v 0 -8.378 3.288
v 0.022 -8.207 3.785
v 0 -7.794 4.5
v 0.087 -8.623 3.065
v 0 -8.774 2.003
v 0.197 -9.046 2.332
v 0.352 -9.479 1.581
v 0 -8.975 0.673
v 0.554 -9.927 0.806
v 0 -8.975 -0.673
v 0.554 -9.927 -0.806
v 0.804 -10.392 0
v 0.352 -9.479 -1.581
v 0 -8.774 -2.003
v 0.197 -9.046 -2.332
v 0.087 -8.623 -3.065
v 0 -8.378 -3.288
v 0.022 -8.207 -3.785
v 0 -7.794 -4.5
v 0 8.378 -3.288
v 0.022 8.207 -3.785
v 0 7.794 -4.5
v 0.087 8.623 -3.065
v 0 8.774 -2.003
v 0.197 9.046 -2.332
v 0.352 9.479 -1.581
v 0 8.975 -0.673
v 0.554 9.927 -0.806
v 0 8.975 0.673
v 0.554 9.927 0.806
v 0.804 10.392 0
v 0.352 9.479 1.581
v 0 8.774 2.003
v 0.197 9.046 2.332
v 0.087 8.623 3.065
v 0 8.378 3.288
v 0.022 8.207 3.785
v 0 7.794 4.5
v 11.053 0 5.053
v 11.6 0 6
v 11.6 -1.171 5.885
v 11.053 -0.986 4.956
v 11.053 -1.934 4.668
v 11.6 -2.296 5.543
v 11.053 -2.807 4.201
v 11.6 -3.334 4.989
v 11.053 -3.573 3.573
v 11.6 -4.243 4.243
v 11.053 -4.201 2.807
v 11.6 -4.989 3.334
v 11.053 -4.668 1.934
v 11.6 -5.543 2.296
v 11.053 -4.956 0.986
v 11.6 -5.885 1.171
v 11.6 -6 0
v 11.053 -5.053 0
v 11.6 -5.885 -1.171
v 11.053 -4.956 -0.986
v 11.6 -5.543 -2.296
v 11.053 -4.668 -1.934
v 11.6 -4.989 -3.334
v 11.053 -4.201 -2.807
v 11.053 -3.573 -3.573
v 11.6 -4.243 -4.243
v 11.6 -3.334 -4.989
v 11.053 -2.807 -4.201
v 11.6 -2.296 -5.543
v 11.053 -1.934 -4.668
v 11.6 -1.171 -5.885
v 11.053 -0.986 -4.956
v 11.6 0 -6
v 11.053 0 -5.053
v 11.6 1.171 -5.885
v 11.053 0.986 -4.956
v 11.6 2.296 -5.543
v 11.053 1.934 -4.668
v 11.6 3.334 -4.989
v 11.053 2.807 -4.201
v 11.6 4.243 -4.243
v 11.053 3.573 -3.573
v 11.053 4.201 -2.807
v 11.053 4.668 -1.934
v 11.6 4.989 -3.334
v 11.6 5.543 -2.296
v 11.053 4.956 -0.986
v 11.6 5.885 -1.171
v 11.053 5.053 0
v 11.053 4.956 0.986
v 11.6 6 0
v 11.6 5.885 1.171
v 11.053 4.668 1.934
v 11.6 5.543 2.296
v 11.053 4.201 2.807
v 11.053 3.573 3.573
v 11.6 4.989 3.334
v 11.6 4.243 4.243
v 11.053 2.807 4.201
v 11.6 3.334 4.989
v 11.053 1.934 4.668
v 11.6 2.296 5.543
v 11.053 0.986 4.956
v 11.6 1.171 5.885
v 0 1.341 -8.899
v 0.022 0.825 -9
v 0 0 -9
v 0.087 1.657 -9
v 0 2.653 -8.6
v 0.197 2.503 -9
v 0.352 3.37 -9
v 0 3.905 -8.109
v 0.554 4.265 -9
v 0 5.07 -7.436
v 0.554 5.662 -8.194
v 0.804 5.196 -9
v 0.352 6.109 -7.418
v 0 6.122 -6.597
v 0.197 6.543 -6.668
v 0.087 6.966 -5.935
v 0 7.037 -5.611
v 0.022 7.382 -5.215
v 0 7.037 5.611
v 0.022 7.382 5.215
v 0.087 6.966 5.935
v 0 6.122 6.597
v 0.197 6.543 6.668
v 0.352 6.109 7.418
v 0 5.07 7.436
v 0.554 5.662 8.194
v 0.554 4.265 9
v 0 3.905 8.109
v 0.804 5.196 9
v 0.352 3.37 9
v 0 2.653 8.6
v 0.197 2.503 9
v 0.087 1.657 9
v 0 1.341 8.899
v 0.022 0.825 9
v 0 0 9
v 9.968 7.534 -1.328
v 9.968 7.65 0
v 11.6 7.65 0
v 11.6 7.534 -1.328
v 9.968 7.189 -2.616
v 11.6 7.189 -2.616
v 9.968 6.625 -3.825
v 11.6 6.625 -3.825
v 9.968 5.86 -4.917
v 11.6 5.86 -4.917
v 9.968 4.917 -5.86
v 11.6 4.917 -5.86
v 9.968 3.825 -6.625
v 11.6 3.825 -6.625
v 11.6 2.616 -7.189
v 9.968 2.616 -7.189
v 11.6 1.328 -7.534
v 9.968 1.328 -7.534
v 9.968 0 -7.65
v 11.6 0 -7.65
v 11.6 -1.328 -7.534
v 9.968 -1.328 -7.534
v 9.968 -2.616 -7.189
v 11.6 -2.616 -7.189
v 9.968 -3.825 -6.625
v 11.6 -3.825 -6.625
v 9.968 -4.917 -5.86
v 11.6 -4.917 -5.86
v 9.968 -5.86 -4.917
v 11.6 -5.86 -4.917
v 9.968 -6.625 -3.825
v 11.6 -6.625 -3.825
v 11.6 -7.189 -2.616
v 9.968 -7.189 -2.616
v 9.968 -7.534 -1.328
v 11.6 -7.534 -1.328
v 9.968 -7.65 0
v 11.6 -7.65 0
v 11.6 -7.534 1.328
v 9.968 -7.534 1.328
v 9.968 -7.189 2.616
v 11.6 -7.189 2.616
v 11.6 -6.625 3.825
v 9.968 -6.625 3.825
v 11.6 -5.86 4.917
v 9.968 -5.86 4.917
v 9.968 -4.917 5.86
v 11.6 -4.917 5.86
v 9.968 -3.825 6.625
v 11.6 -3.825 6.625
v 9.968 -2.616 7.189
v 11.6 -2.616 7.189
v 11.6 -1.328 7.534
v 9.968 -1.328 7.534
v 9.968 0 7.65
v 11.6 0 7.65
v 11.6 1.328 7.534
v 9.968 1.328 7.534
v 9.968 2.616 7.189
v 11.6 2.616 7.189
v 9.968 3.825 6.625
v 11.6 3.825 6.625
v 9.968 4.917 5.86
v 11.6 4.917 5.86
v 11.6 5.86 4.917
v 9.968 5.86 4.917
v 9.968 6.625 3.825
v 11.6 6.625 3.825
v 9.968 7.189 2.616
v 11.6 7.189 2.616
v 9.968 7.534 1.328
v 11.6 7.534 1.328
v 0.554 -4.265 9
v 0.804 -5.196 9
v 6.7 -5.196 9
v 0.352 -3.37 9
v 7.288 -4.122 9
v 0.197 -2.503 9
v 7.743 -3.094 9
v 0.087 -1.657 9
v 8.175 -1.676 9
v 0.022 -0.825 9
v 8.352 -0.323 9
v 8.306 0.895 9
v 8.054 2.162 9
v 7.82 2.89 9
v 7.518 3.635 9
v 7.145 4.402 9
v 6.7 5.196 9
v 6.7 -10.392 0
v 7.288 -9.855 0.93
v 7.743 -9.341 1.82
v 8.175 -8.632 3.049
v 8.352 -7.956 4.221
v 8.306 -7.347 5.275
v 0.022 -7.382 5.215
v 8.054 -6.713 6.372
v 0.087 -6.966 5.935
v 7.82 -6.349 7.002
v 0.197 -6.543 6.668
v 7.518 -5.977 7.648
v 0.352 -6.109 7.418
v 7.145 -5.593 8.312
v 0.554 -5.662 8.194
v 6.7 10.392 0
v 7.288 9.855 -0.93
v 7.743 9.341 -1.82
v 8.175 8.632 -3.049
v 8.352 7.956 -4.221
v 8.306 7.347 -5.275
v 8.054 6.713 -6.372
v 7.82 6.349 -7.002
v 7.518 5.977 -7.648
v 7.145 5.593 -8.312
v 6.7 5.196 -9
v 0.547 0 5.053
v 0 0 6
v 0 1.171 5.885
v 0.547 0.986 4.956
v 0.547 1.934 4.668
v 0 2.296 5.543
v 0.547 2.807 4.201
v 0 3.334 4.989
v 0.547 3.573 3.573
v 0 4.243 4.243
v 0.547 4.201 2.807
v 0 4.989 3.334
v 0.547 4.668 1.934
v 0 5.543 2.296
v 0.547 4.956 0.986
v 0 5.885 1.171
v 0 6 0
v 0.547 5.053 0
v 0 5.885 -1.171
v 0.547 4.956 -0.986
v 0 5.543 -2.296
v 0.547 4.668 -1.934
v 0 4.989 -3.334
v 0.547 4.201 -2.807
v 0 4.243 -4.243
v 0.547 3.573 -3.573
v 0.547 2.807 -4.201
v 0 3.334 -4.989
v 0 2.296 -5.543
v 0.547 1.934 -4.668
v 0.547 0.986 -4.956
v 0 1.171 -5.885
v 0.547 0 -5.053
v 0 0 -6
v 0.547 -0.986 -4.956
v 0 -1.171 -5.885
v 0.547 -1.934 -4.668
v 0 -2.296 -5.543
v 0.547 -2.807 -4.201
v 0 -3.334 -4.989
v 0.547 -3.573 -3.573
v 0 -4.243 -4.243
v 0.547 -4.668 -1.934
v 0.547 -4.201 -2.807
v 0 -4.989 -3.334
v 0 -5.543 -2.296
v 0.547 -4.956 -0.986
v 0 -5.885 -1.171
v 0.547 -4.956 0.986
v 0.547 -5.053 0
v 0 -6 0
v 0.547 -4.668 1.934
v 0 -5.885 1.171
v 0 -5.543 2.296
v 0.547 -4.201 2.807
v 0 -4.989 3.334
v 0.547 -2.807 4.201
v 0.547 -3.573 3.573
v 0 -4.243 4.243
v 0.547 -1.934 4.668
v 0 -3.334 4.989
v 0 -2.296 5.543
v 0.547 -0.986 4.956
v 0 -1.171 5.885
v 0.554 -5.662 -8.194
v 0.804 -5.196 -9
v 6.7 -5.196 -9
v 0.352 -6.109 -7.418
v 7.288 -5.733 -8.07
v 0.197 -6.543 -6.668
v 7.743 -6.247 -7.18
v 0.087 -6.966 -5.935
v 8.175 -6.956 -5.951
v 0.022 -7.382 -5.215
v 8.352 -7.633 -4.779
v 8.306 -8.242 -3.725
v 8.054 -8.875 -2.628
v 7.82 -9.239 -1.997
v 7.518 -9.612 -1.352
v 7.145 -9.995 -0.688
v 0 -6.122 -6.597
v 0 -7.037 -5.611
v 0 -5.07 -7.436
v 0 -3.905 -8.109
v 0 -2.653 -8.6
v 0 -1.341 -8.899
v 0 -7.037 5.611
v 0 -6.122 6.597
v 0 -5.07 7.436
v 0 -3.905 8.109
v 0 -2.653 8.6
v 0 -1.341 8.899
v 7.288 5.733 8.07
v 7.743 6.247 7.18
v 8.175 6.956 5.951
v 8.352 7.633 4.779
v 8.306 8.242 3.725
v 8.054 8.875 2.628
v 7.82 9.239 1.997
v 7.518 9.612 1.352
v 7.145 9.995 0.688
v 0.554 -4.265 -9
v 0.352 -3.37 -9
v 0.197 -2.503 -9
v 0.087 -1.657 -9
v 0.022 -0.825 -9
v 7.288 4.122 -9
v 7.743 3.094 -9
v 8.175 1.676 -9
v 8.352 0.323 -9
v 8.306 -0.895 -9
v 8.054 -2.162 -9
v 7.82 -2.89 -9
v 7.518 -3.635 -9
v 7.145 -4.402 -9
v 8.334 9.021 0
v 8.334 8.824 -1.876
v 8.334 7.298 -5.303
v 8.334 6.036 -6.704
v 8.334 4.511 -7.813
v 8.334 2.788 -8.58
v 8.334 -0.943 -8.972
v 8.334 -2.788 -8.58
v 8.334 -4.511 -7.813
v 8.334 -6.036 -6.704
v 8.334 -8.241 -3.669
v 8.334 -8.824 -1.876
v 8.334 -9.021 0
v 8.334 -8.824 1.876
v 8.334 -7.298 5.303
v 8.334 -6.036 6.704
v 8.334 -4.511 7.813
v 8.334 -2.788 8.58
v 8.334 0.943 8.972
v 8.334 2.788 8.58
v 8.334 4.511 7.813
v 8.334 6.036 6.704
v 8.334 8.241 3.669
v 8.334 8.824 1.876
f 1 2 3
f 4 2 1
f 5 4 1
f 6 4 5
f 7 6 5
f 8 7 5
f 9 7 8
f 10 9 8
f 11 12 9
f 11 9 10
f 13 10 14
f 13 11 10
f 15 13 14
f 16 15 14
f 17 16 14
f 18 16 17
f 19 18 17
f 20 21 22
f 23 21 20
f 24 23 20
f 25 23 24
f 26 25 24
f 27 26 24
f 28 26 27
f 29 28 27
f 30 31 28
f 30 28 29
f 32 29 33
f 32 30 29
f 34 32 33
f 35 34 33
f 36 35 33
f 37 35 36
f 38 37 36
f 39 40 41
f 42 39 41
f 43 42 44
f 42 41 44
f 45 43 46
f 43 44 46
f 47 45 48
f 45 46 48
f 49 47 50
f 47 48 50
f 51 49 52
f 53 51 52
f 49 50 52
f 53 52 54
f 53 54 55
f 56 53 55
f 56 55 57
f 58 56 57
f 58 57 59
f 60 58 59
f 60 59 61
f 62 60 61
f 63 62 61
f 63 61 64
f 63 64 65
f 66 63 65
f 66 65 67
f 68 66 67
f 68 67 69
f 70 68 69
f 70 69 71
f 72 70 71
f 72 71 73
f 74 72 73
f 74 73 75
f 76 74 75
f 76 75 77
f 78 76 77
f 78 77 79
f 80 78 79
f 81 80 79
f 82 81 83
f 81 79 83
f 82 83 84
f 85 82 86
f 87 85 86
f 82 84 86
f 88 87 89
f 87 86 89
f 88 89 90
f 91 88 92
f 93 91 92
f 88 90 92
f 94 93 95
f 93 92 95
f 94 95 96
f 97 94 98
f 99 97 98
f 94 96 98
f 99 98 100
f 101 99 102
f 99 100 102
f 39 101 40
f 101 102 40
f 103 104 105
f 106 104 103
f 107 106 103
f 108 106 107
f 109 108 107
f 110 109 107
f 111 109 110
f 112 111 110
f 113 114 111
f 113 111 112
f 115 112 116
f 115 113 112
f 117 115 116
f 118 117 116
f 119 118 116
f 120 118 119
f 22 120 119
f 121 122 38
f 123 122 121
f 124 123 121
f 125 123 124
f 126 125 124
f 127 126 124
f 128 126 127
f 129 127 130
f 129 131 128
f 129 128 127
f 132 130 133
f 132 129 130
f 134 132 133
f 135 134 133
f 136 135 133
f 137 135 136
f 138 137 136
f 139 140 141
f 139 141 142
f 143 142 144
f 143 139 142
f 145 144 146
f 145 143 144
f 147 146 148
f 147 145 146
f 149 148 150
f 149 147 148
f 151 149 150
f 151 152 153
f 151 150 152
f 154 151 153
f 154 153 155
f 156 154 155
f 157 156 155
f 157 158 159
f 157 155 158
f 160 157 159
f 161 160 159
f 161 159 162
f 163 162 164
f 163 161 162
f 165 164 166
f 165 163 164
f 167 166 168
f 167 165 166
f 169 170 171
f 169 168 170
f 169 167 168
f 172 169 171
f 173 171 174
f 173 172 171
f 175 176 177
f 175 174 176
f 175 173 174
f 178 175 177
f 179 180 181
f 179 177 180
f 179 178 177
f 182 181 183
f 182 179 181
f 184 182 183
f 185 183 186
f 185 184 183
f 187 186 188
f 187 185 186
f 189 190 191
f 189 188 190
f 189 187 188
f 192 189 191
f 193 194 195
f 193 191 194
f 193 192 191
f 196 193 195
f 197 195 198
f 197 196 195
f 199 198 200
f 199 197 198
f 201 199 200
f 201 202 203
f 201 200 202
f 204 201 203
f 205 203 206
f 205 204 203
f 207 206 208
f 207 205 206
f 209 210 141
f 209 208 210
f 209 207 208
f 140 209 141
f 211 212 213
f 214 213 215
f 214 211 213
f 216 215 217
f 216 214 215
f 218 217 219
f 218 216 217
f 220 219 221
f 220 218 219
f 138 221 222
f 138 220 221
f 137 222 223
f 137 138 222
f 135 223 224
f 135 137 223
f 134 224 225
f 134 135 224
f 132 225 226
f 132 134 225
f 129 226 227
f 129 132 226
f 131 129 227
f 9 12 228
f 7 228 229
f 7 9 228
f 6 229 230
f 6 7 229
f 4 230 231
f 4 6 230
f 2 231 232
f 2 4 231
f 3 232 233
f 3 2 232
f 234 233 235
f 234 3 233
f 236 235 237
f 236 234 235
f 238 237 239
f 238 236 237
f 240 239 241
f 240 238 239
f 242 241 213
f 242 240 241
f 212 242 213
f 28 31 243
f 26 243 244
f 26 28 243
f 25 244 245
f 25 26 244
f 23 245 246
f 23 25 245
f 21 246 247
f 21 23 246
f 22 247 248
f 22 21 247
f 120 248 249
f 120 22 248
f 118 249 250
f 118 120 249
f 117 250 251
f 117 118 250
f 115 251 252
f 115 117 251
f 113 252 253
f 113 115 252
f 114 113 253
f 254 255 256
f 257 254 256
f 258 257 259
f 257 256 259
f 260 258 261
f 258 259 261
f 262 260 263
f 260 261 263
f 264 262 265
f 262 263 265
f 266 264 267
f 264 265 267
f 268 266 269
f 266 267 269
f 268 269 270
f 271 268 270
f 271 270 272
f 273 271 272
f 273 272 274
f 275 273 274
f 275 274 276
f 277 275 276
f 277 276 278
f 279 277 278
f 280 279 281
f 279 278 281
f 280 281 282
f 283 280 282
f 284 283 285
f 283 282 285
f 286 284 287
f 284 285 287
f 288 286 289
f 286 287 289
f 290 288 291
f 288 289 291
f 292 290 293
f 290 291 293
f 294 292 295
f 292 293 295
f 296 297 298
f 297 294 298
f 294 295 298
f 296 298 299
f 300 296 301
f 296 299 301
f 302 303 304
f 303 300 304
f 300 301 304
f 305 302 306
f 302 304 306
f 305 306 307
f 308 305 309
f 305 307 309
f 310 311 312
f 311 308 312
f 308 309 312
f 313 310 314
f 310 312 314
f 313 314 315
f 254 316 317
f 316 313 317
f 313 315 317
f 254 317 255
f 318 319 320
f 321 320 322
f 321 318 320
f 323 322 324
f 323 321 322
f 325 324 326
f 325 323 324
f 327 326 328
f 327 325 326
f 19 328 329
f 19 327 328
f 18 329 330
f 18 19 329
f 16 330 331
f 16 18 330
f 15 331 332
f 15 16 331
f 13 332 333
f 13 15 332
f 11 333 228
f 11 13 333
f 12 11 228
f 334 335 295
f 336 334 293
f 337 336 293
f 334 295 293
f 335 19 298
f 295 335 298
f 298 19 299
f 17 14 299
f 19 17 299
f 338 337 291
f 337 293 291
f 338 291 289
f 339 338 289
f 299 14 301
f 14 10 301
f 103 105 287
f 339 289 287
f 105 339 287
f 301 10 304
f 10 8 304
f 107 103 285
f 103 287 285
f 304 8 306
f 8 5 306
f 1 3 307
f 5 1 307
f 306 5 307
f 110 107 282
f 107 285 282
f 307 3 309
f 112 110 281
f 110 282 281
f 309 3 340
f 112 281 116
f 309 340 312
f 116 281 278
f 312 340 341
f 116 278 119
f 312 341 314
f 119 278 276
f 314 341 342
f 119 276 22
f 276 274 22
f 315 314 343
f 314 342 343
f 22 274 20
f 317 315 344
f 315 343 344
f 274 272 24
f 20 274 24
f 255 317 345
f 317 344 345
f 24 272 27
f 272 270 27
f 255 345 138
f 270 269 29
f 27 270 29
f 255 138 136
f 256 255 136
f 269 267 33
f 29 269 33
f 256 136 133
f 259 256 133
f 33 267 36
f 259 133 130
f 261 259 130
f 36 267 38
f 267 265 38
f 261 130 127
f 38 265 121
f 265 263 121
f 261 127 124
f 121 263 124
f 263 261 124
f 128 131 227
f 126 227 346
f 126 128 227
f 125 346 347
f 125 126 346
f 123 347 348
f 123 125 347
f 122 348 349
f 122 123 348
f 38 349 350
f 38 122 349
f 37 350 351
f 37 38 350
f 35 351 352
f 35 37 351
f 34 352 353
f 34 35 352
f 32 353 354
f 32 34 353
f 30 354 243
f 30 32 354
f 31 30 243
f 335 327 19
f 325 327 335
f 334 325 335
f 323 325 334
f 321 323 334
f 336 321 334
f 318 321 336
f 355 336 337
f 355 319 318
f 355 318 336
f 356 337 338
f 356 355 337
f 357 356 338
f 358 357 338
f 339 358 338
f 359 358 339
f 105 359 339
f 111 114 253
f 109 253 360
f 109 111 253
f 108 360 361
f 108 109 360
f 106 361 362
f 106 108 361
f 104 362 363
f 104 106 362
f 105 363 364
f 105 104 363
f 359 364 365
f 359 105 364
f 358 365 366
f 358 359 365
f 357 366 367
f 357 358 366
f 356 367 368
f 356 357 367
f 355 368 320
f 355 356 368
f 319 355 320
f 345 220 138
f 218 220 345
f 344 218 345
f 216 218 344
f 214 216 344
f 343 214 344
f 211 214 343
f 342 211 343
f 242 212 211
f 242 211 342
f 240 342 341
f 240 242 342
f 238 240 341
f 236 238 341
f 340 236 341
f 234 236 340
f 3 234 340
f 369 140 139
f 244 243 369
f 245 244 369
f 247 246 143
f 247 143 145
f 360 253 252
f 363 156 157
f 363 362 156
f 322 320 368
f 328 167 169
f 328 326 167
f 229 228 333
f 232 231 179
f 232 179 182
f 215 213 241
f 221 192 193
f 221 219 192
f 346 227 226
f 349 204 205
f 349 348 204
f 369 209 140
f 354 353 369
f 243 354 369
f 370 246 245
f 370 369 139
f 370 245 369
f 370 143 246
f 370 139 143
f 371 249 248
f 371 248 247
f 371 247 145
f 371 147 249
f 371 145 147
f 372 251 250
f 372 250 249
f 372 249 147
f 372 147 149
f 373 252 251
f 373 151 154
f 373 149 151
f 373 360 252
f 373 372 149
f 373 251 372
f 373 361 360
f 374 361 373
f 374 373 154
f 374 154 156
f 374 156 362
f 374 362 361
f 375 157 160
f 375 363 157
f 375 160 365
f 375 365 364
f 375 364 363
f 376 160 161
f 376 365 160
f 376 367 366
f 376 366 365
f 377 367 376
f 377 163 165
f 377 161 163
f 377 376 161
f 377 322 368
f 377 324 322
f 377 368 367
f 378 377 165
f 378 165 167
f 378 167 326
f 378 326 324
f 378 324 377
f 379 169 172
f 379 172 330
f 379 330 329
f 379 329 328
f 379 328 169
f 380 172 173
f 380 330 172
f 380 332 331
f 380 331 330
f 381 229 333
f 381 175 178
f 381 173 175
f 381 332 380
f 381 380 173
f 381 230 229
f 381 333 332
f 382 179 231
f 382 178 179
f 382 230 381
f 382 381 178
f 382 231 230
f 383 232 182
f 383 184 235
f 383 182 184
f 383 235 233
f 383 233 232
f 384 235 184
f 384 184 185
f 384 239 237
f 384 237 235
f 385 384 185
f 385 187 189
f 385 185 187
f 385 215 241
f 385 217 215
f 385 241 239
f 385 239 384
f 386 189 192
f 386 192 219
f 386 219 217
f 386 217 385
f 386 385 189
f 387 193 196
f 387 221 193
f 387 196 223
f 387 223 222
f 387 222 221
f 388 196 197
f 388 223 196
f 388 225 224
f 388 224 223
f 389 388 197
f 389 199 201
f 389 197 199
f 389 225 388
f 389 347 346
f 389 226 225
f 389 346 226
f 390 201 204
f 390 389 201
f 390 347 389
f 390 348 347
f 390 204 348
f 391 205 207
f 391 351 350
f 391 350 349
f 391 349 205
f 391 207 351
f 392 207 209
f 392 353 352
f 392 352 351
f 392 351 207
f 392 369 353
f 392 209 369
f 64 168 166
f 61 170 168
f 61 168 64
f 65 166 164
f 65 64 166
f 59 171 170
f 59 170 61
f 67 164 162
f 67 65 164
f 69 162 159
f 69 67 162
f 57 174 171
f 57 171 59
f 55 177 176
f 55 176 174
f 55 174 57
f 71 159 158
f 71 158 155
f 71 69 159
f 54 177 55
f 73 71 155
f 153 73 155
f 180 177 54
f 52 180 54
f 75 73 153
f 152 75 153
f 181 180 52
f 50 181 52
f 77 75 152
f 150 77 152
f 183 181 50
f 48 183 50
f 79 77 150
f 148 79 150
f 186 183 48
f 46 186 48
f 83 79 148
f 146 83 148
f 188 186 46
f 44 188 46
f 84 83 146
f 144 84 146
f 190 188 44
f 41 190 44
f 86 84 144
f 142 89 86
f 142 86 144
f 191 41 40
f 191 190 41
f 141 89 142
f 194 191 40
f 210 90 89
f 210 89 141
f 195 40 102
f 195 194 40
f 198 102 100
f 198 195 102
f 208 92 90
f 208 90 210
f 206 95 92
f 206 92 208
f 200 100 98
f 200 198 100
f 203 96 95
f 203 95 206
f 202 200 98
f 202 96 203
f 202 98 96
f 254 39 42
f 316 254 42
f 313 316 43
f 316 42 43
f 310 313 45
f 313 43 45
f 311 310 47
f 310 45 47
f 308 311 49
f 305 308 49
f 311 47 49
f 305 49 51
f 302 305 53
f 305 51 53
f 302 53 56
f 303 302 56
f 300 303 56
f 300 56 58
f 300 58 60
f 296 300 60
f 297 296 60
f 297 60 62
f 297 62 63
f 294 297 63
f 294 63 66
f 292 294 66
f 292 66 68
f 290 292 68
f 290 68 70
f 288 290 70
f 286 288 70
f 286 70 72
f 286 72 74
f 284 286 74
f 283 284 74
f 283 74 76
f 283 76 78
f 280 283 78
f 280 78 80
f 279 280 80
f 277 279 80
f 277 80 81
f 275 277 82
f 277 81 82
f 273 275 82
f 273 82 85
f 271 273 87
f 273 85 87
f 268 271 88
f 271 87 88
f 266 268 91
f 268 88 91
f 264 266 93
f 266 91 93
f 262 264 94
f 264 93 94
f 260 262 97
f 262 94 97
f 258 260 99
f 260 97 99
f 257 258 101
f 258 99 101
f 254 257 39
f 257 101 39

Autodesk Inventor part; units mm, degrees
ref_plane "YZ Plane" through (0, 0, 0) normal (1, 0, 0) x (0, 1, 0)
ref_plane "XZ Plane" through (0, 0, 0) normal (0, 1, 0) x (-1, 0, 0)
sketch "Náčrt1" plane through (0, 0, 0) normal (1, 0, 0) x (0, 1, 0)
  line L0 (-10.3923, 0) -> (-5.1962, 9)
  line L1 (-5.1962, 9) -> (5.1962, 9)
  line L2 (5.1962, 9) -> (10.3923, 0)
  line L3 (10.3923, 0) -> (5.1962, -9)
  line L4 (5.1962, -9) -> (-5.1962, -9)
  line L5 (-5.1962, -9) -> (-10.3923, 0)
  point P0 (0, 0)
  point P1 (0, 0)
  dimension "d0" = 20.7846
extrude "Těleso" add sketch "Náčrt1" along normal blind 11.6
sketch "Náčrt2" plane through (0, 0, 0) normal (-1, 0, 0) x (0, 0, 1)
  line L0 (0, -14.5492) -> (0, 14.5492) projected
  line L1 (-12.6, 0) -> (12.6, 0) projected
  point P0 (0, 0)
hole "Závit" at (0, 0, 0) direction (1, 0, 0) diameter 10.106 end through all thread size "M12x1.75" class "6H" standard "ANSI Metric M Profile"
chamfer "Zkosení1" distance 0.9472 angle 30 1 edges at (0, 0, -5.053) measured on face at (0, -6.5823, -3.9568)
chamfer "Zkosení2" distance 0.9472 angle 30 1 edges at (11.6, 0, -5.053) measured on face at (11.6, -6.5823, -3.9568)
sketch "Náčrt3" plane through (0, 0, 0) normal (0, 0, 1) x (1, 0, 0)
  line L0 (0, 5.1962) -> (0, 10.3923) projected
  line L1 (0, 10.3923) -> (11.6, 10.3923) projected
  line L2 (11.6, 5.1962) -> (11.6, 10.3923) projected
  line L3 (-2.32, 0) -> (13.92, 0) projected
  line L4 (0.8038, 10.3923) -> (0, 9)
  line L5 (11.6, 7.65) -> (9.9682, 7.65)
  line L6 (9.9682, 7.65) -> (6.7, 10.3923)
  dimension "d3" = 30
  dimension "d5" = 18
  dimension "d6" = 15.3
  dimension "d8" = 50
  dimension "d9" = 6.7
revolve "Zkosení3" cut sketch "Náčrt3" angle 360 about axis through (-10, 0, 0) along (1, 0, 0)
ref_plane "Work Plane1" through (29.8423, 0, 0) normal (0, 0, 1) x (-1, 0, 0)
equation "\"d0\" = 1.1547 * SW"
equation "\"d1\" = KOH"
equation "\"d3\" = ANG1"
equation "\"d5\" = SW0"
equation "\"d6\" = SW1"
equation "\"d8\" = ANG2"
equation "\"d9\" = KOH1"
equation "\"d10\" = -0.5 * GD1 + 0.5 * NND"
equation "\"d39\" = -0.5 * GD1 + 0.5 * NND"
equation "\"d12\" = -0.5 * GD1 + 0.5 * NND"
equation "\"d40\" = -0.5 * GD1 + 0.5 * NND"
equation "\"ANG1\" = 30deg"
equation "\"ANG2\" = 50deg"
equation "\"NND\" = 12"
equation "\"KOH\" = 11.6"
equation "\"SW\" = 18"
equation "\"SW0\" = SW"
equation "\"SW1\" = 0.85 * SW"
equation "\"KOH1\" = 6.7"
equation "\"GUL\" = 0.541266 * PTC"
equation "\"THREADDIA\" = 12"
equation "\"TOA\" = 30deg"
equation "\"PTC\" = 1.75"
equation "\"E0\" = 1.155 * SW"
equation "\"GAL\" = 0.541266 * PTC"
equation "\"GD1\" = 10.105569"
properties part number "ANSI B18.16.3M - Property Class 5 and 10 - Metric M12 x 1.75 Typ kovu" material "Ocel, měkká"
